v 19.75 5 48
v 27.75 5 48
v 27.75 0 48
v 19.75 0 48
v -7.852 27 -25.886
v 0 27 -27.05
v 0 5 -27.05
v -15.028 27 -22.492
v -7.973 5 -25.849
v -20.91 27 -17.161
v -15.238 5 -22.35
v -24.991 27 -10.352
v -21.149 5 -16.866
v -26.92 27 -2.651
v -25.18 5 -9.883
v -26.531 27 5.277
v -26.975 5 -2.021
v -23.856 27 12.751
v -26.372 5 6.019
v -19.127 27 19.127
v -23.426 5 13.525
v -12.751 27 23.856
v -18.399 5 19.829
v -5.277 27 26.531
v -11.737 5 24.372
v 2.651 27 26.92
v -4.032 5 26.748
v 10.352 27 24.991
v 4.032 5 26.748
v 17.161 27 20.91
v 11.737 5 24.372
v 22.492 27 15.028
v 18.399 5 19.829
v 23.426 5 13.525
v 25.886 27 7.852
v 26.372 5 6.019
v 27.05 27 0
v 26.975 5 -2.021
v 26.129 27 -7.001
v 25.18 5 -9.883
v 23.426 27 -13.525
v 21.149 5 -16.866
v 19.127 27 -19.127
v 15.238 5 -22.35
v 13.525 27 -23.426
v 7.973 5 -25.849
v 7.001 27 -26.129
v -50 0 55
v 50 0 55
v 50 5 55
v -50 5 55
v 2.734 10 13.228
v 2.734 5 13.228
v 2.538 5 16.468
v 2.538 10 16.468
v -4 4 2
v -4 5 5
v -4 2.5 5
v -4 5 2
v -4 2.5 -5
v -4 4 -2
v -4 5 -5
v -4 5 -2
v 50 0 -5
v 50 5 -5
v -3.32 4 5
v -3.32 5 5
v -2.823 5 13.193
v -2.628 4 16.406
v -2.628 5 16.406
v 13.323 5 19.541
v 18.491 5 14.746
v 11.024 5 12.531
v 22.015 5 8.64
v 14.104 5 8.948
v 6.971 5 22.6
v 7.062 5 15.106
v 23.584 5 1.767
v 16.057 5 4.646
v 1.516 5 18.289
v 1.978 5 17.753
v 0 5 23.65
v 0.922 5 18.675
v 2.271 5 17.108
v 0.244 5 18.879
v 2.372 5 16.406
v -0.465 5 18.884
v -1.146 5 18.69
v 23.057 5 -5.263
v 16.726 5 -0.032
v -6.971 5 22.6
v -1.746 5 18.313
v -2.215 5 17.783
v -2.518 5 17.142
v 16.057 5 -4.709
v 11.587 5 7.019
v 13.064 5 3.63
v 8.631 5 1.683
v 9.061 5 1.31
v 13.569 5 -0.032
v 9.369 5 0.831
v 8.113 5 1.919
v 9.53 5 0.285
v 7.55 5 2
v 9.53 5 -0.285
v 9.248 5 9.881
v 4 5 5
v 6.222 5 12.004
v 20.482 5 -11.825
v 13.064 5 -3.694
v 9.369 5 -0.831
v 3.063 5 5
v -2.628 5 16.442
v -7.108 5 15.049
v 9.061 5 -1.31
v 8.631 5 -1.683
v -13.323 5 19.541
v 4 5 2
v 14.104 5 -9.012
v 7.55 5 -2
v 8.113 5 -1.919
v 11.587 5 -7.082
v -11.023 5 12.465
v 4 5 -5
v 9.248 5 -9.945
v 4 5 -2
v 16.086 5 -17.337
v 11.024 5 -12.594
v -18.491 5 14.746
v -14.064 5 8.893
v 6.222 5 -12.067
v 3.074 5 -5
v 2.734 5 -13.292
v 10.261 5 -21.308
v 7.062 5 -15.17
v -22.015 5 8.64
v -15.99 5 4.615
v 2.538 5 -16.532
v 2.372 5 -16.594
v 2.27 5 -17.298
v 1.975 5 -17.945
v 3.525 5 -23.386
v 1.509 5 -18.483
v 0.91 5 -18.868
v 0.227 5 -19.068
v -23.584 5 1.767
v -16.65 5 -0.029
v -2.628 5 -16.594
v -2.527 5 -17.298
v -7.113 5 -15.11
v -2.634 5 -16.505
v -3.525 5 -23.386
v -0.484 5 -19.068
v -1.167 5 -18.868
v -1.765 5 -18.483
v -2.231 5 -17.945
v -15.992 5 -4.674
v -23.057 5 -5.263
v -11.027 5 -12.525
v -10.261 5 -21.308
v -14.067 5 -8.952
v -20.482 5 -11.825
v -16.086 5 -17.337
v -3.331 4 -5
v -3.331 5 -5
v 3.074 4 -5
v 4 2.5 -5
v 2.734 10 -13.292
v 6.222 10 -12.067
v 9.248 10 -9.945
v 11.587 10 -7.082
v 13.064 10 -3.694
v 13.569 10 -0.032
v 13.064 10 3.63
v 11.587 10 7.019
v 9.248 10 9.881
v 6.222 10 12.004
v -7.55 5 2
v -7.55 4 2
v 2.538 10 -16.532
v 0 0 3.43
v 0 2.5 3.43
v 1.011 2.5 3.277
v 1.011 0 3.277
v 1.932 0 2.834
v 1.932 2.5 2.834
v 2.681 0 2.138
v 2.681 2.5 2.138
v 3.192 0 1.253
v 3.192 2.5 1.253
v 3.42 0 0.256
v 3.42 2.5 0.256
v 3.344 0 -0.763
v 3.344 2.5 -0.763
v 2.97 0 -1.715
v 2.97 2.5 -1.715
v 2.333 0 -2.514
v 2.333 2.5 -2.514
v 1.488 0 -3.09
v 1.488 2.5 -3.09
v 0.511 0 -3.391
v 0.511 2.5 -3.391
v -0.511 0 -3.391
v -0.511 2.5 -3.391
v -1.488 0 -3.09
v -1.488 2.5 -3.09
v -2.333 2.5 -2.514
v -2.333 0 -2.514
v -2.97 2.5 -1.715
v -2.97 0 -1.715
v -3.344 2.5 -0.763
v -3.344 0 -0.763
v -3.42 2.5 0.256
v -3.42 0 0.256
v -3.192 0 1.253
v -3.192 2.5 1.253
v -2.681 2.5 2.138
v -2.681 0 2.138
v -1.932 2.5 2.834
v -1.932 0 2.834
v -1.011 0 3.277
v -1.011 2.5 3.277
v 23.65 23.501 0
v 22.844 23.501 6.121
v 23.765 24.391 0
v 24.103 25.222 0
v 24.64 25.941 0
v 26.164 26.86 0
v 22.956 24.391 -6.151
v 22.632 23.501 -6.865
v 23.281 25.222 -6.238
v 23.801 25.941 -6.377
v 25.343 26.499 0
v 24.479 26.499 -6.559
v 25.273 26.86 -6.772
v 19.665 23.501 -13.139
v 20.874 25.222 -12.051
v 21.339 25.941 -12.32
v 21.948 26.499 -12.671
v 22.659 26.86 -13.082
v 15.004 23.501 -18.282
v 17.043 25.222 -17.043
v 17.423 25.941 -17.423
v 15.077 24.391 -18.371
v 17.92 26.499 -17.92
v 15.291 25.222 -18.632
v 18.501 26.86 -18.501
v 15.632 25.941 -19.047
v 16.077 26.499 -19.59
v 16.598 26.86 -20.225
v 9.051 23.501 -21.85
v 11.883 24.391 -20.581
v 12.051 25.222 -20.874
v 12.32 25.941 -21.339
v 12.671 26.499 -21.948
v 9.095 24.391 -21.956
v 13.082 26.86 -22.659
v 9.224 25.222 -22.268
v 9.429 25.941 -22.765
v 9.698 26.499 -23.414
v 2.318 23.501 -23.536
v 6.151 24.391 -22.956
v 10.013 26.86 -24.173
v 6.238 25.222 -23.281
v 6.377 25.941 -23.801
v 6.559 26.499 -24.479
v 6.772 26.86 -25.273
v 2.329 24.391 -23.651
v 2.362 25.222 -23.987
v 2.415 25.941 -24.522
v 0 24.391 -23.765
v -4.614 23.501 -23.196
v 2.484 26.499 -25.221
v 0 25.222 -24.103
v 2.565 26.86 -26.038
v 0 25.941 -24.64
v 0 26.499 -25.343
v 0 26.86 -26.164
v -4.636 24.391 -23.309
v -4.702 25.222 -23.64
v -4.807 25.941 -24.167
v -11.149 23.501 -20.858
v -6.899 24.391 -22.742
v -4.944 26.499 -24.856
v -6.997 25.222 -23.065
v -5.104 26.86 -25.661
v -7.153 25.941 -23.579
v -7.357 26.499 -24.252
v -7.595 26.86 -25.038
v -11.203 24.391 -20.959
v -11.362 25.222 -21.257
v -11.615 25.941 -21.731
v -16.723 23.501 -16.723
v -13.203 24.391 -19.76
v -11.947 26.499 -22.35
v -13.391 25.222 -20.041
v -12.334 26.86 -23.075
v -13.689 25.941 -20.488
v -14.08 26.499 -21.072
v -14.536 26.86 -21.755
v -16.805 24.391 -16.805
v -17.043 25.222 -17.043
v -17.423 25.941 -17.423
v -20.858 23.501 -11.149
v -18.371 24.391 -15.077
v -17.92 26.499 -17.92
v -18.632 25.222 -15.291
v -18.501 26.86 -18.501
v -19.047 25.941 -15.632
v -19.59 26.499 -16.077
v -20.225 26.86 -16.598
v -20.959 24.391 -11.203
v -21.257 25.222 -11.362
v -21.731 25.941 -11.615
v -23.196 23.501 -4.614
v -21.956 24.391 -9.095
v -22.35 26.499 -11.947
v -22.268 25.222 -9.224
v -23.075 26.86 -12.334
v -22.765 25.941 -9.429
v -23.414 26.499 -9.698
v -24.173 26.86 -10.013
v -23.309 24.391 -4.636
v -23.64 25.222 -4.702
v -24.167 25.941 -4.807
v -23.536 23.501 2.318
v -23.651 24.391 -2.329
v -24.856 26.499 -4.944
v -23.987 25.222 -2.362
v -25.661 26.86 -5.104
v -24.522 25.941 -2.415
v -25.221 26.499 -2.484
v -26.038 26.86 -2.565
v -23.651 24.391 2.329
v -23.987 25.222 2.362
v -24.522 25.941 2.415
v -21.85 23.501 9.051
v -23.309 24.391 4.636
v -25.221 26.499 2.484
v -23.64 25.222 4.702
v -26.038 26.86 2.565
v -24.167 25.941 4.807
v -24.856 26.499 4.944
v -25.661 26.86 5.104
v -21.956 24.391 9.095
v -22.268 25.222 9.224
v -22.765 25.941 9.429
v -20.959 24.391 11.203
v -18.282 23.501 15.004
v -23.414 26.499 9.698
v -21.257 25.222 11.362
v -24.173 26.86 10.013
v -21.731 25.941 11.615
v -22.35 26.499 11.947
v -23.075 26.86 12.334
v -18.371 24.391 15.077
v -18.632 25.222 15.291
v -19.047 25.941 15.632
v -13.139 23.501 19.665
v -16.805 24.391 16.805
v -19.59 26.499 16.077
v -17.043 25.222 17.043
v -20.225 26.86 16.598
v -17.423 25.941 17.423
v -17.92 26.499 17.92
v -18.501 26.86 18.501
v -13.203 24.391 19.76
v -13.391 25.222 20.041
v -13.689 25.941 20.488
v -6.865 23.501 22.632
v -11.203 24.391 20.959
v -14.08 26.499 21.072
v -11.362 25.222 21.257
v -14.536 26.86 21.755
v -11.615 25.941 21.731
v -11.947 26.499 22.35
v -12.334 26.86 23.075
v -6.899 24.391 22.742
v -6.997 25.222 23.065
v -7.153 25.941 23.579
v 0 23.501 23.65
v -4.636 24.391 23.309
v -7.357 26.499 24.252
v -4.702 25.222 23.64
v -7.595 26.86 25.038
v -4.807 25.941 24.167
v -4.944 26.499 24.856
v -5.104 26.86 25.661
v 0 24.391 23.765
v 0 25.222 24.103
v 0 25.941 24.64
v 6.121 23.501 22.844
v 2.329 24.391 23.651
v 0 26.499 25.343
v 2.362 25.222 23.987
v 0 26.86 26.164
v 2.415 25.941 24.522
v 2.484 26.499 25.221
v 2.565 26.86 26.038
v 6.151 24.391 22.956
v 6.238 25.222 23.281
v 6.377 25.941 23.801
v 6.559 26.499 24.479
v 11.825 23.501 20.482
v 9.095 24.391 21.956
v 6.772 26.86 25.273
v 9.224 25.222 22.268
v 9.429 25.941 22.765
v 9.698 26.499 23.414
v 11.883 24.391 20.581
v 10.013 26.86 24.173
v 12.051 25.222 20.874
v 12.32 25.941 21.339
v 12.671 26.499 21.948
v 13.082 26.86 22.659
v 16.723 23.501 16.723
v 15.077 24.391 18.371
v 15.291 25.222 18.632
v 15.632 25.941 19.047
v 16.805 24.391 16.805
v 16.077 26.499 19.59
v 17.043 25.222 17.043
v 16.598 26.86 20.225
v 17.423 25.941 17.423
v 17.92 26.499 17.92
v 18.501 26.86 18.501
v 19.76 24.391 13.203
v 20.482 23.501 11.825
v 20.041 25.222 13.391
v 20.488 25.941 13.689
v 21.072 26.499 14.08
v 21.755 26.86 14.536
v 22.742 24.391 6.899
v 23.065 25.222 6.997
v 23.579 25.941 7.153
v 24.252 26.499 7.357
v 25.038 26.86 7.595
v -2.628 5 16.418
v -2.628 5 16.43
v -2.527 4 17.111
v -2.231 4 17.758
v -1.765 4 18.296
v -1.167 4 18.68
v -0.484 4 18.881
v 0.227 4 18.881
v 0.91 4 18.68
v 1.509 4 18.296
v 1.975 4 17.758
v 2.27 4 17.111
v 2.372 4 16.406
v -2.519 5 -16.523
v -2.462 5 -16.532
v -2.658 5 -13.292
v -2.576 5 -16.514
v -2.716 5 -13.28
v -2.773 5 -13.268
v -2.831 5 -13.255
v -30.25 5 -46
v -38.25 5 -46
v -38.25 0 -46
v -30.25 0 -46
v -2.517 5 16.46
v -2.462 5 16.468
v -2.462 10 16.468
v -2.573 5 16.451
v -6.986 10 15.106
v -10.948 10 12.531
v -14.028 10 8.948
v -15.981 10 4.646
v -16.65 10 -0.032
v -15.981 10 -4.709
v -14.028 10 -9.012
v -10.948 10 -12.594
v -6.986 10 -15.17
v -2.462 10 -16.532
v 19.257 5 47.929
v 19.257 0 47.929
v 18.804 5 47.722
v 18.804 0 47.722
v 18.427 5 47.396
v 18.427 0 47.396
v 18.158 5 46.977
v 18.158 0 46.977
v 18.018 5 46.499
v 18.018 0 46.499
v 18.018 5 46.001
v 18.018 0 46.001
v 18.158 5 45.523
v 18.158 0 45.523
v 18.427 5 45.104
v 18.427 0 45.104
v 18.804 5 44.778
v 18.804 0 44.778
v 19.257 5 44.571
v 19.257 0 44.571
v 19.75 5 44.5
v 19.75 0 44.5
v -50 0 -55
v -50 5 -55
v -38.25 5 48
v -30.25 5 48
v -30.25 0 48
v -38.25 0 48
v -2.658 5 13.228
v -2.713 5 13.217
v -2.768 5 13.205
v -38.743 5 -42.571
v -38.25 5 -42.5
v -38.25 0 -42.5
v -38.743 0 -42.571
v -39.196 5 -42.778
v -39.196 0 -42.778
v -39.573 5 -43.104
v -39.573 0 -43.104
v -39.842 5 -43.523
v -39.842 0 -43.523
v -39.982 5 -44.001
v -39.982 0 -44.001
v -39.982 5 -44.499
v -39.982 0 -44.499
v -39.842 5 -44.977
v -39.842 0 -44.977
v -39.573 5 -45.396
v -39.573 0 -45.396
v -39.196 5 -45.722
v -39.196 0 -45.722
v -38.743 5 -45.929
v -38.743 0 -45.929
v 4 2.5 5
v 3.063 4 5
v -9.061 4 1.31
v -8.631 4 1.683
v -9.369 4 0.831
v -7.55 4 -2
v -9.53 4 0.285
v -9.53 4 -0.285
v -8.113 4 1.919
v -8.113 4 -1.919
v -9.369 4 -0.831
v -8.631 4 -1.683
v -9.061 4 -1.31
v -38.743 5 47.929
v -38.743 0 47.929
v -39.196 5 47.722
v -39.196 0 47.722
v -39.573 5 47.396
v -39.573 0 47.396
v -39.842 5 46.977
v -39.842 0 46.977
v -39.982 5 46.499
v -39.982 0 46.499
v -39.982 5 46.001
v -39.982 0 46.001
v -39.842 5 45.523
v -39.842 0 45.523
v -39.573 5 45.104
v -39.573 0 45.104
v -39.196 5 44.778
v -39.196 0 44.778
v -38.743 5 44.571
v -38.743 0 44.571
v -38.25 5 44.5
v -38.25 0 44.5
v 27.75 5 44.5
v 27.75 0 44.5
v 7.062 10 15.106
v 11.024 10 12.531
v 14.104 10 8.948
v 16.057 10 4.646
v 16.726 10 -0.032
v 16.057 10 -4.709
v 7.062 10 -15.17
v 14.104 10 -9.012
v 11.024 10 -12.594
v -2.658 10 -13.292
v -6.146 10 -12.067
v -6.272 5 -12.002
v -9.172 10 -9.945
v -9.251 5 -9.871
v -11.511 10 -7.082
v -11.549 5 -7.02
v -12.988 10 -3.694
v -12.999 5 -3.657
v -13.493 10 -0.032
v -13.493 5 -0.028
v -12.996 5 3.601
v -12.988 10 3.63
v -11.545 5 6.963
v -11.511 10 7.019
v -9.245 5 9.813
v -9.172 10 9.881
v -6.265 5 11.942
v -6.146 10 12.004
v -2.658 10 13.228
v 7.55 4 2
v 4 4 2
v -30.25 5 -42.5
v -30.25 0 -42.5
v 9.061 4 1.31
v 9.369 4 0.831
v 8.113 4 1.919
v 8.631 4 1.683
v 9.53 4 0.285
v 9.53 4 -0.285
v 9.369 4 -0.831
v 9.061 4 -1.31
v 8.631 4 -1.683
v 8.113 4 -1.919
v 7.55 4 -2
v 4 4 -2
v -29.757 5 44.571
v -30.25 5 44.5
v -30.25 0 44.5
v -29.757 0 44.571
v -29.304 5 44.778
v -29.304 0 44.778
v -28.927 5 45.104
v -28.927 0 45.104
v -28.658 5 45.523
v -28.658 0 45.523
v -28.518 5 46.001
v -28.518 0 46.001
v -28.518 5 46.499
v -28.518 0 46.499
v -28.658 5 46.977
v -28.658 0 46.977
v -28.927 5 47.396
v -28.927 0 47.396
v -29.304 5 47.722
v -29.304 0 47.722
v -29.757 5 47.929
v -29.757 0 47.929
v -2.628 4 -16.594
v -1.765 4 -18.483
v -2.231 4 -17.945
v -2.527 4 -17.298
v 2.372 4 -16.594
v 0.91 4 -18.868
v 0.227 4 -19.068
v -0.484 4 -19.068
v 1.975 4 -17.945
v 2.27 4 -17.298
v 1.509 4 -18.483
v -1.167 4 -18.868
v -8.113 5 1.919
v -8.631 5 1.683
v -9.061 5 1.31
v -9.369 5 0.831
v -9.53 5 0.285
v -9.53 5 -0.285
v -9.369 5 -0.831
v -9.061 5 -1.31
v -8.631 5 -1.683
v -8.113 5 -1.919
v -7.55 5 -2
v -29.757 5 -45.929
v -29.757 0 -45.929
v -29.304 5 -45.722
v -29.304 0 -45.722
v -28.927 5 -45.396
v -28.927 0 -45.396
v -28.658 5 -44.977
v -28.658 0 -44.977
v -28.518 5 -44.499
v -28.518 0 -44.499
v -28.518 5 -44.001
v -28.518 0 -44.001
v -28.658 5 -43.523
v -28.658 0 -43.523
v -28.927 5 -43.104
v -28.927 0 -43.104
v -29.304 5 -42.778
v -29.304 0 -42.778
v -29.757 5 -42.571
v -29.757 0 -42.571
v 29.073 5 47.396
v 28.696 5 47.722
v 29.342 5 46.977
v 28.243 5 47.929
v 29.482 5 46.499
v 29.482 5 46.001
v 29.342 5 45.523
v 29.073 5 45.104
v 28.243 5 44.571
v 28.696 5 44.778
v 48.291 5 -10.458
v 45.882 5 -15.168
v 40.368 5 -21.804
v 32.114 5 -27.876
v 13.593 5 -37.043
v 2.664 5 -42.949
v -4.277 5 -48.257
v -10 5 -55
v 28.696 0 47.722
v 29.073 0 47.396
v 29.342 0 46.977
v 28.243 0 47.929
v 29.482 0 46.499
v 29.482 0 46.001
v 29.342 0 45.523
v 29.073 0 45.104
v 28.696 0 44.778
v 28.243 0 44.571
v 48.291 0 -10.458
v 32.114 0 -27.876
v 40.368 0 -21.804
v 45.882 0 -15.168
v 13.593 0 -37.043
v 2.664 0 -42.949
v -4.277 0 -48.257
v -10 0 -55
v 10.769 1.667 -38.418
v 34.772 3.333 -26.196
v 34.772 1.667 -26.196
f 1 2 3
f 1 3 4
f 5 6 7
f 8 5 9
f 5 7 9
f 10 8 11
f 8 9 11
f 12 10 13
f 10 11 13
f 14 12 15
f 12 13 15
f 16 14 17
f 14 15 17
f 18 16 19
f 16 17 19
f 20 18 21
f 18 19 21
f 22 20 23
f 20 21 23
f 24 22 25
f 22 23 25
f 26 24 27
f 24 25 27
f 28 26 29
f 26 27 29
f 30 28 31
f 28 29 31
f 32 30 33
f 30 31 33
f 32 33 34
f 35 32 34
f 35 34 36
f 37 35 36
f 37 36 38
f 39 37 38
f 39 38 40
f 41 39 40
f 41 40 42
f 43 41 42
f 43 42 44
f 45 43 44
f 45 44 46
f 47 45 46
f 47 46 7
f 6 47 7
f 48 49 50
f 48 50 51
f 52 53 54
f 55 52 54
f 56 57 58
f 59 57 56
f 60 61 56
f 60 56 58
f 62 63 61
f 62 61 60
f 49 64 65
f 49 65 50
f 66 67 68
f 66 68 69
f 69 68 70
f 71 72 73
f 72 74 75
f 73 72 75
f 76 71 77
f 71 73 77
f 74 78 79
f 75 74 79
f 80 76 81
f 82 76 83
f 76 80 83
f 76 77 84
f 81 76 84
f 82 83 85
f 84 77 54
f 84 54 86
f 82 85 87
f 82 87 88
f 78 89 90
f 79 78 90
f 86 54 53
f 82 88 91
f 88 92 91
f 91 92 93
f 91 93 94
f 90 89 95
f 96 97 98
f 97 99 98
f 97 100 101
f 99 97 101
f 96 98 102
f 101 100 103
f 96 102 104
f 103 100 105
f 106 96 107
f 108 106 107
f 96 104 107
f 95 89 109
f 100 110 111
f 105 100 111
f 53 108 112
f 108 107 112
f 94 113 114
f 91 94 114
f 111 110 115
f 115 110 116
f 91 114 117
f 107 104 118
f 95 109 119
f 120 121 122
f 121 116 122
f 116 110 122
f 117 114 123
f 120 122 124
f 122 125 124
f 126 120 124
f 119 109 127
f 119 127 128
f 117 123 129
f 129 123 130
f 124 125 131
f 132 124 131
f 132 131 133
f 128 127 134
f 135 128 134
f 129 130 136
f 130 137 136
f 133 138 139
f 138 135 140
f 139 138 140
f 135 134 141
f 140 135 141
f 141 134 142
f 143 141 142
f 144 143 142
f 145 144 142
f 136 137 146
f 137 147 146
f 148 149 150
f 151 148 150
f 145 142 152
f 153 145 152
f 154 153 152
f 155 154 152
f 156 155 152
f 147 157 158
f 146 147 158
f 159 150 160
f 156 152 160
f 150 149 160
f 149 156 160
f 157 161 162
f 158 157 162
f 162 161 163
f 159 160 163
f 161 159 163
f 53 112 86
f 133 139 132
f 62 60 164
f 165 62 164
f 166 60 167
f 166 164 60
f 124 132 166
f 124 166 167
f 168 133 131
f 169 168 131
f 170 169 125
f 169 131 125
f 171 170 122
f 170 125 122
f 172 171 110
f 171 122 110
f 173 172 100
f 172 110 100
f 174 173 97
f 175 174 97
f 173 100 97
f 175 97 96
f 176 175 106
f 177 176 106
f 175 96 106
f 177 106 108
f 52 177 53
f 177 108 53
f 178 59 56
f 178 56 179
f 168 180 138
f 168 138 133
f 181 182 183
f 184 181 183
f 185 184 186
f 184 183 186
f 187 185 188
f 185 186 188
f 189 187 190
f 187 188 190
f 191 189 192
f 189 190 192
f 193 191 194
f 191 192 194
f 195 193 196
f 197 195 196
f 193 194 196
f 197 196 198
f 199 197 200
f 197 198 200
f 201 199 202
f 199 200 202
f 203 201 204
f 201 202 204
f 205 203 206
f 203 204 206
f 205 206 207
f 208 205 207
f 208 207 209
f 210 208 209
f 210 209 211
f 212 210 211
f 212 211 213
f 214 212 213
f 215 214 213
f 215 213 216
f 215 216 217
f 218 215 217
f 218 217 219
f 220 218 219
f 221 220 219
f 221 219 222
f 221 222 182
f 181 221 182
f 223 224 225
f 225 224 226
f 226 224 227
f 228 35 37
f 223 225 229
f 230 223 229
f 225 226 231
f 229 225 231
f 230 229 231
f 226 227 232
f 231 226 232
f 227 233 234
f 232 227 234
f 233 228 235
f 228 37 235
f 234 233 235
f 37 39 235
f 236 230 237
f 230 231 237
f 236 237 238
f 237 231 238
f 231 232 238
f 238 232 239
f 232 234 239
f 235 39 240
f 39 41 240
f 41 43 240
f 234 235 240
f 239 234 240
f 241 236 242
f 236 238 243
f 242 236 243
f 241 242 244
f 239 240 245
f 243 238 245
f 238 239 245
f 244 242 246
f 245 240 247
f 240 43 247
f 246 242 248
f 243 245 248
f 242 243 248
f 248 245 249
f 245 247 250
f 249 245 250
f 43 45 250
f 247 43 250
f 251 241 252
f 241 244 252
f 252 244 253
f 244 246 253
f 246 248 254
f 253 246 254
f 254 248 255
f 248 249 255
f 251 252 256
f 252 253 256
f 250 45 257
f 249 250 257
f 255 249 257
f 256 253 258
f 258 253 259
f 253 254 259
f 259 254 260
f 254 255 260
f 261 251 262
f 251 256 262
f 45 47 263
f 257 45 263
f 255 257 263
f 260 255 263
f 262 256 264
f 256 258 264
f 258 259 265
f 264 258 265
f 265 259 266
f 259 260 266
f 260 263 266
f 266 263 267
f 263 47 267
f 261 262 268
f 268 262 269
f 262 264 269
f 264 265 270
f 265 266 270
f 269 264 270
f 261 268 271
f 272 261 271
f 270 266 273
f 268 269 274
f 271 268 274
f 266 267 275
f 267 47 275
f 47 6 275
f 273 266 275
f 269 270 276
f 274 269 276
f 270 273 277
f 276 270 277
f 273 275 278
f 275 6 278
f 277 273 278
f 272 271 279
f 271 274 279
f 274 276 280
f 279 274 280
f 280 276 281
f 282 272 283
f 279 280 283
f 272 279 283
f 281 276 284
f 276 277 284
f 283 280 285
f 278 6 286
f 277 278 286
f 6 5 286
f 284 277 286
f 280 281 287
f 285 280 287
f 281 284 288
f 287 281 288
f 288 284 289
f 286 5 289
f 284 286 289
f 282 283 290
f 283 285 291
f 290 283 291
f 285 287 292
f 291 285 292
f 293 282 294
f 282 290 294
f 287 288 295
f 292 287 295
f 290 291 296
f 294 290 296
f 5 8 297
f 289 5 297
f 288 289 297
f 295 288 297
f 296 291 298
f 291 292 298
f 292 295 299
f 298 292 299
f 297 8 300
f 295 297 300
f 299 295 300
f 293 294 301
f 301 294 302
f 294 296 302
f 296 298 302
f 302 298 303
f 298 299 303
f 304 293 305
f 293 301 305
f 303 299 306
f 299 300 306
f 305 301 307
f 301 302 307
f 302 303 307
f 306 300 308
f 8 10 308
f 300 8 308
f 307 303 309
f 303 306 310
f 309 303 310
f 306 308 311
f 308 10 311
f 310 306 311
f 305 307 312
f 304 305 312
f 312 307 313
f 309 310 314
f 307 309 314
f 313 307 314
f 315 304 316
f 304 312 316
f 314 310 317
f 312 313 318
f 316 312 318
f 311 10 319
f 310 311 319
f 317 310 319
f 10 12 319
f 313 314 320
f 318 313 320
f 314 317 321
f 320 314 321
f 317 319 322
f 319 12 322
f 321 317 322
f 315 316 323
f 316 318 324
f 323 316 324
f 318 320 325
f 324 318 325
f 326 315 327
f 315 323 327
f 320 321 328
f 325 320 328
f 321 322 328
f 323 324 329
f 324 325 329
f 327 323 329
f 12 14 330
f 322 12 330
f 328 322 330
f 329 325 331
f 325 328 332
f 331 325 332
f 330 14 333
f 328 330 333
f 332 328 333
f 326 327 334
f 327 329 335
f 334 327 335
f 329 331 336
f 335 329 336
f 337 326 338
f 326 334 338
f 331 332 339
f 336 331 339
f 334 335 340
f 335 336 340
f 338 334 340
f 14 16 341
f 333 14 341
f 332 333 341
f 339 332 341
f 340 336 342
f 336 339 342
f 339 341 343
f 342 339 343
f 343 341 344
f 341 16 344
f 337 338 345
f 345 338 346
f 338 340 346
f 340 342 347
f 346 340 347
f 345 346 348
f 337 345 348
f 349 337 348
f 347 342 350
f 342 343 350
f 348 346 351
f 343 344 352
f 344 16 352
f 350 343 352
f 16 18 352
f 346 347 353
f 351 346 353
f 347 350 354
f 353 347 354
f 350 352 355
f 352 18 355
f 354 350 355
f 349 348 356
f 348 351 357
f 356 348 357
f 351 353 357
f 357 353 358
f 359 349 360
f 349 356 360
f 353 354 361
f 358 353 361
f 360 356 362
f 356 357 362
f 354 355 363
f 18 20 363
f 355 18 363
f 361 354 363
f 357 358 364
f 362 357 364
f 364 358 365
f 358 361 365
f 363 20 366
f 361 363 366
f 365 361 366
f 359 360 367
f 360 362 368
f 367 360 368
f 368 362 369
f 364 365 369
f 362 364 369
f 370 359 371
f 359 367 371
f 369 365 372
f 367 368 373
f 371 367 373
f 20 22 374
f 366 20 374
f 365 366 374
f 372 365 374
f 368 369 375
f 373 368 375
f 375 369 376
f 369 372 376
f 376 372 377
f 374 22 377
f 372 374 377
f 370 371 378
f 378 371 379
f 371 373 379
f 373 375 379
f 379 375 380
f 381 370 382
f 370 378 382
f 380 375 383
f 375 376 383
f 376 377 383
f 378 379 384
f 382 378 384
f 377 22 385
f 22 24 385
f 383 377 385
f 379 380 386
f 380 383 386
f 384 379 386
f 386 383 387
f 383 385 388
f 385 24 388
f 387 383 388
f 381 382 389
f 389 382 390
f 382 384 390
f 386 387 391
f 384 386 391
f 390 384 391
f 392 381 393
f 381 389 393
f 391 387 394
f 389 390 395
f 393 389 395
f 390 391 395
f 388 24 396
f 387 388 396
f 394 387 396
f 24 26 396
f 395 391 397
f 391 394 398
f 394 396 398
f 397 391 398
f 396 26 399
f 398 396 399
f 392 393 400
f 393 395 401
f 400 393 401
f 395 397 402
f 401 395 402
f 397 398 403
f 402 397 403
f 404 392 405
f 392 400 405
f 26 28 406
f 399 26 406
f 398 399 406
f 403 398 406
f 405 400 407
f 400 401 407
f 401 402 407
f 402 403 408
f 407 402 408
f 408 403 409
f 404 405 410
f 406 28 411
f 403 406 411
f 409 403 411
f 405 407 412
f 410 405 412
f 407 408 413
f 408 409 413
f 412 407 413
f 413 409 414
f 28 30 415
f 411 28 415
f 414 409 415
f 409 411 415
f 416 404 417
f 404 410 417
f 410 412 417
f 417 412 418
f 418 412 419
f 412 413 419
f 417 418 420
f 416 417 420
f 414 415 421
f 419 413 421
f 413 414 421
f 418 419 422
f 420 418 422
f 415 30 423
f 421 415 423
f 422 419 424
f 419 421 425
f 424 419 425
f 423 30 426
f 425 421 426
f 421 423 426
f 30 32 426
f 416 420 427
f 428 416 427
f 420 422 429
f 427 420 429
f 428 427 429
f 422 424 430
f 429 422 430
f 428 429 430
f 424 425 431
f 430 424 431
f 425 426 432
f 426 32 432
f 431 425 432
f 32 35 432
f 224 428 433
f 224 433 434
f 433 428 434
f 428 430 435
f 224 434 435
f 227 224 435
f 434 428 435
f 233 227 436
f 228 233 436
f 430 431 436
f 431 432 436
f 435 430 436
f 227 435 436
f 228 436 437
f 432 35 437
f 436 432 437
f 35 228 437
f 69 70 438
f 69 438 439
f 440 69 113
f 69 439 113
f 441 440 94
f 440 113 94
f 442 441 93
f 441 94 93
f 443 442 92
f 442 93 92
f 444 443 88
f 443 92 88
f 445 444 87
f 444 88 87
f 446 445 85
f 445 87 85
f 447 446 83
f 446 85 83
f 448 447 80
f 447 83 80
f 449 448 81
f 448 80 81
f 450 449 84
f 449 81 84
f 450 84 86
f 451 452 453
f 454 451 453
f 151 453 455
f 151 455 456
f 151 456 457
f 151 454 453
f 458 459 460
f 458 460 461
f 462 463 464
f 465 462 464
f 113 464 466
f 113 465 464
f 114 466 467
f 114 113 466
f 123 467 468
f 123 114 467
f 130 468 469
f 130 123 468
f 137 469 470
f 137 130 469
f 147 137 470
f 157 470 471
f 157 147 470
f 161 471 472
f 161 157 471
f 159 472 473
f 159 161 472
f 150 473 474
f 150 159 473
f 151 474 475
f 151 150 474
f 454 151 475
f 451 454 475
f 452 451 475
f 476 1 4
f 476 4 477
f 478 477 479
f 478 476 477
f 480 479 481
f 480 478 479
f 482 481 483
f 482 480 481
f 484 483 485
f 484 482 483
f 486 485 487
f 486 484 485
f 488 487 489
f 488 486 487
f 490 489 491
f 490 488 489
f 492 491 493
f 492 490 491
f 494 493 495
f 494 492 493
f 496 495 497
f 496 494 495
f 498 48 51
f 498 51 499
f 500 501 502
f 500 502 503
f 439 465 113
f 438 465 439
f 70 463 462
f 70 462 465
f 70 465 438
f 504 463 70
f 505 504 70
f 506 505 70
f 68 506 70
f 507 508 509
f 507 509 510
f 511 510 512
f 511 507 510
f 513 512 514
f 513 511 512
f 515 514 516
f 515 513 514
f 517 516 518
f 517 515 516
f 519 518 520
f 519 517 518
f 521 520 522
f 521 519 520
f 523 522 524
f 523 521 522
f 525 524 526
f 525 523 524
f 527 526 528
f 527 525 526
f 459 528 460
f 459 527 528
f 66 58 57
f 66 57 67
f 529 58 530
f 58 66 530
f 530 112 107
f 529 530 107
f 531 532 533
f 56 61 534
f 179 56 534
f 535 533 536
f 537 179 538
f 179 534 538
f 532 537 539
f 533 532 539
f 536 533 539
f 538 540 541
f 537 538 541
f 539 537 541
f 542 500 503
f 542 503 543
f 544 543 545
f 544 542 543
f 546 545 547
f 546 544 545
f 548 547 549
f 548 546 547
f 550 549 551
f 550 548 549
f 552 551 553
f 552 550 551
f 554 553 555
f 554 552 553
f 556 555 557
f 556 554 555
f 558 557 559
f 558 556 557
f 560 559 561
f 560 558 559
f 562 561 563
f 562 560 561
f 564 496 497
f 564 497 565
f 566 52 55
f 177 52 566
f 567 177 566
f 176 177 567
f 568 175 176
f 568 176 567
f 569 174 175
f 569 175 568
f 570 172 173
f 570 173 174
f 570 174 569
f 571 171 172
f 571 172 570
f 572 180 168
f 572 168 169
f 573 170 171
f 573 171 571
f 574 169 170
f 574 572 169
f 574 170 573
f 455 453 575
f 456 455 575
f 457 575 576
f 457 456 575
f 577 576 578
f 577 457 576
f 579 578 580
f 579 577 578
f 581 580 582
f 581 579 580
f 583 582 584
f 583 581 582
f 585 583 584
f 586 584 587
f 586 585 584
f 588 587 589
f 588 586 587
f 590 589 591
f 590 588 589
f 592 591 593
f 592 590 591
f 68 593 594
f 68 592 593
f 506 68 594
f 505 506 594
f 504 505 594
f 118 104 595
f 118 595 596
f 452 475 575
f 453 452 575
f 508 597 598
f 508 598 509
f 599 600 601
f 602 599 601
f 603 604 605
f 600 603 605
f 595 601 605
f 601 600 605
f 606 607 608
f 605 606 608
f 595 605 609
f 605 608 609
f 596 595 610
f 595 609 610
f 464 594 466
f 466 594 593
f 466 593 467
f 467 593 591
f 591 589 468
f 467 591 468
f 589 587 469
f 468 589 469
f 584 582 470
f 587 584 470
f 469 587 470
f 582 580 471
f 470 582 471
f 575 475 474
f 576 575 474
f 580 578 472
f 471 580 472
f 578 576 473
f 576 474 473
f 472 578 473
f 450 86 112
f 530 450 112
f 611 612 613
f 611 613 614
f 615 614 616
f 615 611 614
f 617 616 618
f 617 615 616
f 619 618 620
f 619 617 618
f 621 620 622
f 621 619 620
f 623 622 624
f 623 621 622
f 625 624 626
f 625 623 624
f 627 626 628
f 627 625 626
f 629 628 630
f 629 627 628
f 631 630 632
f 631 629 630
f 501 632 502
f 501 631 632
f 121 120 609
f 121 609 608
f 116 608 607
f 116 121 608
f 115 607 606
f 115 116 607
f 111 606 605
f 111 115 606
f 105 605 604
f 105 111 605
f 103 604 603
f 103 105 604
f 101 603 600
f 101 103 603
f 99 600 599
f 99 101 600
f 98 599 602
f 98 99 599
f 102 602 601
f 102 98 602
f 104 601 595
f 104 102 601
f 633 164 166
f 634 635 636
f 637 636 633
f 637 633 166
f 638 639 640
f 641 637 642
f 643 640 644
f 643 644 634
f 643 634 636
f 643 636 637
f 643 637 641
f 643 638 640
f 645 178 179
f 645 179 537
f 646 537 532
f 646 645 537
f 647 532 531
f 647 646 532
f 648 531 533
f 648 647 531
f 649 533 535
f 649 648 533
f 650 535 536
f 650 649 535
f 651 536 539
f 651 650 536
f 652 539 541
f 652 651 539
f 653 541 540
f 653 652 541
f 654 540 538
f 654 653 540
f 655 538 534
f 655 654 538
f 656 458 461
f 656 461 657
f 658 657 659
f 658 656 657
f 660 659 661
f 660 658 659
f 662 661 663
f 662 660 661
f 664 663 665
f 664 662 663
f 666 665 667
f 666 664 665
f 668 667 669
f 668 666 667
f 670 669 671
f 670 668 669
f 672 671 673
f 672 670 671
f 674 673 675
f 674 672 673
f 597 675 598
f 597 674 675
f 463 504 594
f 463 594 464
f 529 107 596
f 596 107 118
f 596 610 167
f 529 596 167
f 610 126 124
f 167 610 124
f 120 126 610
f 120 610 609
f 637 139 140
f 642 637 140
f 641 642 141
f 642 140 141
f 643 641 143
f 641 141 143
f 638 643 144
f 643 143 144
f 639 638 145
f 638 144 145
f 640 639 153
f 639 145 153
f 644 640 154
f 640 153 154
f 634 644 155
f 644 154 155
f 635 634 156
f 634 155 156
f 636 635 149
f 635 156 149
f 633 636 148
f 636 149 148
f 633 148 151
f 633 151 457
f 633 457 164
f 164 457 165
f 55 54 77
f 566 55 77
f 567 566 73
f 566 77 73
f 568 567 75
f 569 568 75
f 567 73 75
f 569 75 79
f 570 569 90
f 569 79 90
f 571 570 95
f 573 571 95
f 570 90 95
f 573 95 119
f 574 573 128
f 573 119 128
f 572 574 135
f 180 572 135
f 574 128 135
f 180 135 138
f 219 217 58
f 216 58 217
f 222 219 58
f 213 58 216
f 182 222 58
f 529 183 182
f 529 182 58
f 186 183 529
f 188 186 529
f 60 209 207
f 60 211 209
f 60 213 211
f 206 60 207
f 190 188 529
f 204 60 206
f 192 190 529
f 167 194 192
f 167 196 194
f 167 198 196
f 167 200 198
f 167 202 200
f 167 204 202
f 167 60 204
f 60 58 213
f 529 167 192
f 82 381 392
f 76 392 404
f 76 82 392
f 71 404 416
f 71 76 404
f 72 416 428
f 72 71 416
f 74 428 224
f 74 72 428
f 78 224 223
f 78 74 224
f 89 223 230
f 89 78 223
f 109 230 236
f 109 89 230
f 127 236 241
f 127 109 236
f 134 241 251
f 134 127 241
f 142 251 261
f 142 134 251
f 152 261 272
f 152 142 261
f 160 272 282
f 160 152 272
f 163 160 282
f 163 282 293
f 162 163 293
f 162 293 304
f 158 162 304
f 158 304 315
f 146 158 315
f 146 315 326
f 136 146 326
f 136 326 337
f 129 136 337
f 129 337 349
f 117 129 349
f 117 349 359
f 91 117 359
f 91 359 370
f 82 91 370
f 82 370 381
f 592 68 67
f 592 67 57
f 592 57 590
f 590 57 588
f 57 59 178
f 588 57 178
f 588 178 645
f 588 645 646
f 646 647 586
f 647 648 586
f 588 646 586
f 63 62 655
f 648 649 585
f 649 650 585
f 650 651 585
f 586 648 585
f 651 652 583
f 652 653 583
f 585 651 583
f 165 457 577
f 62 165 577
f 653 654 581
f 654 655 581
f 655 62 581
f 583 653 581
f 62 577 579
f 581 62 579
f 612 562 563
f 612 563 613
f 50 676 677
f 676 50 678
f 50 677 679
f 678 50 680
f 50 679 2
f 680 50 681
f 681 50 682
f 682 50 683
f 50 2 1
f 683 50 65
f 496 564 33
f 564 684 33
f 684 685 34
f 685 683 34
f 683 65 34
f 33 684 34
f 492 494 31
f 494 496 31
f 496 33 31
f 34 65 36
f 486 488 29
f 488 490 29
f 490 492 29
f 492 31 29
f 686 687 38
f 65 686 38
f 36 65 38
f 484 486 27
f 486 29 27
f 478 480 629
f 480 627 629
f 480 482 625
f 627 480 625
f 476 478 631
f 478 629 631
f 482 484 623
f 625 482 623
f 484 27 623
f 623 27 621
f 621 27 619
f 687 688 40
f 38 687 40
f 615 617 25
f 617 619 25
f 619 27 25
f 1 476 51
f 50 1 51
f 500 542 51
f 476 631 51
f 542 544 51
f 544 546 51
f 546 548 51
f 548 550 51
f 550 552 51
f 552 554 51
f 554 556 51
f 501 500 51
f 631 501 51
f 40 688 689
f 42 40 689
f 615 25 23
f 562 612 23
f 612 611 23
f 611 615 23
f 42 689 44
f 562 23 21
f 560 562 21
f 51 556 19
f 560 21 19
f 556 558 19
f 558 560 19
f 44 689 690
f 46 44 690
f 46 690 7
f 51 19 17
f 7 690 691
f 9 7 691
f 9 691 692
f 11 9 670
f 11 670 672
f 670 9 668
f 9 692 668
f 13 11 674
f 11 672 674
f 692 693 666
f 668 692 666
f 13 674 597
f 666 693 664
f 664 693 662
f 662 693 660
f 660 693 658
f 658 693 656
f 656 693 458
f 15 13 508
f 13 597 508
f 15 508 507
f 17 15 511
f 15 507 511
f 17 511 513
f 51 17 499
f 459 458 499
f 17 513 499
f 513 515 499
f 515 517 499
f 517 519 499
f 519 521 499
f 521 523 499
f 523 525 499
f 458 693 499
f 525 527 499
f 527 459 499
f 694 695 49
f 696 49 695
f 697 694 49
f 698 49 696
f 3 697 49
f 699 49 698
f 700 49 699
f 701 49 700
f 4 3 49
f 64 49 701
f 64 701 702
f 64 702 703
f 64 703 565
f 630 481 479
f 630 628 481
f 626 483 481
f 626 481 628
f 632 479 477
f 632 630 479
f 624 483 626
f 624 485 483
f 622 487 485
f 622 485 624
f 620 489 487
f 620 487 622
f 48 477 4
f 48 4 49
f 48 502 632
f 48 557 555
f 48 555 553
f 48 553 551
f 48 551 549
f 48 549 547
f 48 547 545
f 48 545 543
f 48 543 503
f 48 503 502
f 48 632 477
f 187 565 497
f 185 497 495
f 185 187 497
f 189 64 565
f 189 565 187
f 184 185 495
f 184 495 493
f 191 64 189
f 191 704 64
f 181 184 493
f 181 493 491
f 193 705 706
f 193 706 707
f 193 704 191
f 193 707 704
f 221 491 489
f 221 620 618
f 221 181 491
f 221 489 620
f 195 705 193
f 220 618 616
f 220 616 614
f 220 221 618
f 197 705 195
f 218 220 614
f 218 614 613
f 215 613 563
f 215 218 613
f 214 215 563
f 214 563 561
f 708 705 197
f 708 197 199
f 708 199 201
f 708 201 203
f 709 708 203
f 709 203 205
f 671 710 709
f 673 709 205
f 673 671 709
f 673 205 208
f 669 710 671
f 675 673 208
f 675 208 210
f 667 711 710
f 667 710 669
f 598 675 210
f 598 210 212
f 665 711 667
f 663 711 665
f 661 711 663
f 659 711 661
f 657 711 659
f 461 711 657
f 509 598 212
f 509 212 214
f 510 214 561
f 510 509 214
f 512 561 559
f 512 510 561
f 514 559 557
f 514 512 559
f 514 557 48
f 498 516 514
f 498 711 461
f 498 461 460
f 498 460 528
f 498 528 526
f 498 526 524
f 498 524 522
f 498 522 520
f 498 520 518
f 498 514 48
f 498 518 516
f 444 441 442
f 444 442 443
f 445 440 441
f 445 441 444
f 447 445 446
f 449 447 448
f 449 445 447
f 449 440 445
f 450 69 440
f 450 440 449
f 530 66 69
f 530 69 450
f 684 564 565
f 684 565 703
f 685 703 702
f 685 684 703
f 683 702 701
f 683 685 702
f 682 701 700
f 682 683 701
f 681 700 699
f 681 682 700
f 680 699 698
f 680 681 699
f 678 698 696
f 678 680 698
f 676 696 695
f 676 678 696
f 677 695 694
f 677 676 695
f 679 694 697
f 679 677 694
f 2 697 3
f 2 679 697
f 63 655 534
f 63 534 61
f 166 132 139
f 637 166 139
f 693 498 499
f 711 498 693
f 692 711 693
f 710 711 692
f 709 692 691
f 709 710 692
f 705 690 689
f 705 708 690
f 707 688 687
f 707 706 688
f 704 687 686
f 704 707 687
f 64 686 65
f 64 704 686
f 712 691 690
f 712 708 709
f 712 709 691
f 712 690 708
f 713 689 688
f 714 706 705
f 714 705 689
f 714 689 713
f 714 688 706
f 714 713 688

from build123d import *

# Parameters (mm, degrees)
BOSS_EXTRU_1_DEPTH      = 5
ENL_V_MAT_EXTRU_1_DEPTH = 15
ESQUISSE4_W             = 8
ESQUISSE4_H             = 10
ENL_V_MAT_EXTRU_2_DEPTH = 2.5
ENL_V_MAT_EXTRU_3_DEPTH = 1
ENL_V_MAT_EXTRU_4_DEPTH = 1
BOSS_EXTRU_2_DEPTH      = 5
ESQUISSE9_R             = 27.050324391
ESQUISSE9_R_2           = 23.650324391
BOSS_EXTRU_3_DEPTH      = 22
ESQUISSE10_R            = 3.42951926
ENL_V_MAT_EXTRU_5_DEPTH = 22


with BuildPart() as part:
    # Esquisse1 → Boss.-Extru.1 (new body)
    with BuildSketch(Plane(origin=(0, 0, 0), x_dir=(1, 0, 0), z_dir=(0, 1, 0))):
        with BuildLine():
            Line((-50, 55), (-10, 55))
            add(Edge.make_bspline(
                [(-10, 55), (5.148759318, 31.794007065), (43.163191576, 35.128217793), (50, 5)],
                knots=[0, 0, 0, 0, 1, 1, 1, 1], degree=3))
            Line((50, 5), (50, -55))
            Line((50, -55), (-50, -55))
            Line((-50, -55), (-50, 55))
        make_face()
    extrude(amount=BOSS_EXTRU_1_DEPTH)

    # Esquisse3 → Enlèv. mat.-Extru.1 (cut)
    with BuildSketch(Plane(origin=(0, 5, 0), x_dir=(1, 0, 0), z_dir=(0, 1, 0))):
        with BuildLine():
            Line((-38.25, 46), (-30.25, 46))
            ThreePointArc((-30.25, 46), (-28.5, 44.25), (-30.25, 42.5))
            Line((-30.25, 42.5), (-38.25, 42.5))
            ThreePointArc((-38.25, 42.5), (-40, 44.25), (-38.25, 46))
        make_face()
        with BuildLine():
            Line((-38.25, -44.5), (-30.25, -44.5))
            ThreePointArc((-30.25, -44.5), (-28.5, -46.25), (-30.25, -48))
            Line((-30.25, -48), (-38.25, -48))
            ThreePointArc((-38.25, -48), (-40, -46.25), (-38.25, -44.5))
        make_face()
        with BuildLine():
            Line((19.75, -44.5), (27.75, -44.5))
            ThreePointArc((27.75, -44.5), (29.5, -46.25), (27.75, -48))
            Line((27.75, -48), (19.75, -48))
            ThreePointArc((19.75, -48), (18, -46.25), (19.75, -44.5))
        make_face()
    extrude(amount=-ENL_V_MAT_EXTRU_1_DEPTH, mode=Mode.SUBTRACT)

    # Esquisse4 → Enlèv. mat.-Extru.2 (cut)
    with BuildSketch(Plane(origin=(0, 5, 0), x_dir=(1, 0, 0), z_dir=(0, 1, 0))):
        Rectangle(ESQUISSE4_W, ESQUISSE4_H)
    extrude(amount=-ENL_V_MAT_EXTRU_2_DEPTH, mode=Mode.SUBTRACT)

    # Esquisse6 → Enlèv. mat.-Extru.3 (cut)
    with BuildSketch(Plane(origin=(0, 5, 0), x_dir=(1, 0, 0), z_dir=(0, 1, 0))):
        with BuildLine():
            Line((-2.628313647, 16.593617601), (-3.628313647, 0.093617601))
            Line((-3.628313647, 0.093617601), (-2.628313647, -16.406382399))
            ThreePointArc((-2.628313647, -16.406382399), (-0.128313647, -18.906382399), (2.371686353, -16.406382399))
            Line((2.371686353, -16.406382399), (3.371686353, 0.093617601))
            Line((3.371686353, 0.093617601), (2.371686353, 16.593617601))
            ThreePointArc((2.371686353, 16.593617601), (-0.128313647, 19.093617601), (-2.628313647, 16.593617601))
        make_face()
    extrude(amount=-ENL_V_MAT_EXTRU_3_DEPTH, mode=Mode.SUBTRACT)

    # Esquisse7 → Enlèv. mat.-Extru.4 (cut)
    with BuildSketch(Plane(origin=(0, 5, 0), x_dir=(1, 0, 0), z_dir=(0, 1, 0))):
        with BuildLine():
            Line((-7.55, 2), (7.55, 2))
            ThreePointArc((7.55, 2), (9.55, 0), (7.55, -2))
            Line((7.55, -2), (-7.55, -2))
            ThreePointArc((-7.55, -2), (-9.55, 0), (-7.55, 2))
        make_face()
    extrude(amount=-ENL_V_MAT_EXTRU_4_DEPTH, mode=Mode.SUBTRACT)

    # Esquisse8 → Boss.-Extru.2 (add)
    with BuildSketch(Plane(origin=(0, 5, 0), x_dir=(1, 0, 0), z_dir=(0, 1, 0))):
        with BuildLine():
            Line((-2.462005123, 16.531813588), (-2.658382394, 13.291588605))
            ThreePointArc((-2.658382394, 13.291588605), (-13.493157472, 0.031813588), (-2.658382394, -13.22796143))
            Line((-2.658382394, -13.22796143), (-2.462005123, -16.468186412))
            ThreePointArc((-2.462005123, -16.468186412), (-16.650324391, 0.031813588), (-2.462005123, 16.531813588))
        make_face()
        with BuildLine():
            Line((2.537994877, 16.531813588), (2.734372149, 13.291588605))
            ThreePointArc((2.734372149, 13.291588605), (13.569147227, 0.031813588), (2.734372149, -13.22796143))
            Line((2.734372149, -13.22796143), (2.537994877, -16.468186412))
            ThreePointArc((2.537994877, -16.468186412), (16.726314146, 0.031813588), (2.537994877, 16.531813588))
        make_face()
    extrude(amount=BOSS_EXTRU_2_DEPTH)

    # Esquisse9 → Boss.-Extru.3 (add)
    with BuildSketch(Plane(origin=(0, 5, 0), x_dir=(1, 0, 0), z_dir=(0, 1, 0))):
        with Locations(Location((0, 0, 0), (0, 0, 90))):
            Circle(ESQUISSE9_R)
        with Locations(Location((0, 0, 0), (0, 0, 270))):
            Circle(ESQUISSE9_R_2, mode=Mode.SUBTRACT)
    extrude(amount=BOSS_EXTRU_3_DEPTH)

    # Esquisse10 → Enlèv. mat.-Extru.5 (cut)
    with BuildSketch(Plane(origin=(0, 2.5, 0), x_dir=(1, 0, 0), z_dir=(0, 1, 0))):
        with Locations(Location((0, 0, 0), (0, 0, 270))):
            Circle(ESQUISSE10_R)
    extrude(amount=-ENL_V_MAT_EXTRU_5_DEPTH, mode=Mode.SUBTRACT)

    # Congé1: read off the stored shape, not the designer's step
    # Congé1 outline → Congé1 (revolve, cut)
    with BuildSketch(Plane.XY):
        with BuildLine():
            ThreePointArc((23.650324391, 23.501428863), (24.640344311, 25.940691047), (27.050324391, 27))
            Line((27.050324391, 27), (23.650324391, 27))
            Line((23.650324391, 27), (23.650324391, 23.501428863))
        make_face()
    revolve(axis=Axis((0, 0, 0), (0, 1, 0)), mode=Mode.SUBTRACT)


solid = part.part
